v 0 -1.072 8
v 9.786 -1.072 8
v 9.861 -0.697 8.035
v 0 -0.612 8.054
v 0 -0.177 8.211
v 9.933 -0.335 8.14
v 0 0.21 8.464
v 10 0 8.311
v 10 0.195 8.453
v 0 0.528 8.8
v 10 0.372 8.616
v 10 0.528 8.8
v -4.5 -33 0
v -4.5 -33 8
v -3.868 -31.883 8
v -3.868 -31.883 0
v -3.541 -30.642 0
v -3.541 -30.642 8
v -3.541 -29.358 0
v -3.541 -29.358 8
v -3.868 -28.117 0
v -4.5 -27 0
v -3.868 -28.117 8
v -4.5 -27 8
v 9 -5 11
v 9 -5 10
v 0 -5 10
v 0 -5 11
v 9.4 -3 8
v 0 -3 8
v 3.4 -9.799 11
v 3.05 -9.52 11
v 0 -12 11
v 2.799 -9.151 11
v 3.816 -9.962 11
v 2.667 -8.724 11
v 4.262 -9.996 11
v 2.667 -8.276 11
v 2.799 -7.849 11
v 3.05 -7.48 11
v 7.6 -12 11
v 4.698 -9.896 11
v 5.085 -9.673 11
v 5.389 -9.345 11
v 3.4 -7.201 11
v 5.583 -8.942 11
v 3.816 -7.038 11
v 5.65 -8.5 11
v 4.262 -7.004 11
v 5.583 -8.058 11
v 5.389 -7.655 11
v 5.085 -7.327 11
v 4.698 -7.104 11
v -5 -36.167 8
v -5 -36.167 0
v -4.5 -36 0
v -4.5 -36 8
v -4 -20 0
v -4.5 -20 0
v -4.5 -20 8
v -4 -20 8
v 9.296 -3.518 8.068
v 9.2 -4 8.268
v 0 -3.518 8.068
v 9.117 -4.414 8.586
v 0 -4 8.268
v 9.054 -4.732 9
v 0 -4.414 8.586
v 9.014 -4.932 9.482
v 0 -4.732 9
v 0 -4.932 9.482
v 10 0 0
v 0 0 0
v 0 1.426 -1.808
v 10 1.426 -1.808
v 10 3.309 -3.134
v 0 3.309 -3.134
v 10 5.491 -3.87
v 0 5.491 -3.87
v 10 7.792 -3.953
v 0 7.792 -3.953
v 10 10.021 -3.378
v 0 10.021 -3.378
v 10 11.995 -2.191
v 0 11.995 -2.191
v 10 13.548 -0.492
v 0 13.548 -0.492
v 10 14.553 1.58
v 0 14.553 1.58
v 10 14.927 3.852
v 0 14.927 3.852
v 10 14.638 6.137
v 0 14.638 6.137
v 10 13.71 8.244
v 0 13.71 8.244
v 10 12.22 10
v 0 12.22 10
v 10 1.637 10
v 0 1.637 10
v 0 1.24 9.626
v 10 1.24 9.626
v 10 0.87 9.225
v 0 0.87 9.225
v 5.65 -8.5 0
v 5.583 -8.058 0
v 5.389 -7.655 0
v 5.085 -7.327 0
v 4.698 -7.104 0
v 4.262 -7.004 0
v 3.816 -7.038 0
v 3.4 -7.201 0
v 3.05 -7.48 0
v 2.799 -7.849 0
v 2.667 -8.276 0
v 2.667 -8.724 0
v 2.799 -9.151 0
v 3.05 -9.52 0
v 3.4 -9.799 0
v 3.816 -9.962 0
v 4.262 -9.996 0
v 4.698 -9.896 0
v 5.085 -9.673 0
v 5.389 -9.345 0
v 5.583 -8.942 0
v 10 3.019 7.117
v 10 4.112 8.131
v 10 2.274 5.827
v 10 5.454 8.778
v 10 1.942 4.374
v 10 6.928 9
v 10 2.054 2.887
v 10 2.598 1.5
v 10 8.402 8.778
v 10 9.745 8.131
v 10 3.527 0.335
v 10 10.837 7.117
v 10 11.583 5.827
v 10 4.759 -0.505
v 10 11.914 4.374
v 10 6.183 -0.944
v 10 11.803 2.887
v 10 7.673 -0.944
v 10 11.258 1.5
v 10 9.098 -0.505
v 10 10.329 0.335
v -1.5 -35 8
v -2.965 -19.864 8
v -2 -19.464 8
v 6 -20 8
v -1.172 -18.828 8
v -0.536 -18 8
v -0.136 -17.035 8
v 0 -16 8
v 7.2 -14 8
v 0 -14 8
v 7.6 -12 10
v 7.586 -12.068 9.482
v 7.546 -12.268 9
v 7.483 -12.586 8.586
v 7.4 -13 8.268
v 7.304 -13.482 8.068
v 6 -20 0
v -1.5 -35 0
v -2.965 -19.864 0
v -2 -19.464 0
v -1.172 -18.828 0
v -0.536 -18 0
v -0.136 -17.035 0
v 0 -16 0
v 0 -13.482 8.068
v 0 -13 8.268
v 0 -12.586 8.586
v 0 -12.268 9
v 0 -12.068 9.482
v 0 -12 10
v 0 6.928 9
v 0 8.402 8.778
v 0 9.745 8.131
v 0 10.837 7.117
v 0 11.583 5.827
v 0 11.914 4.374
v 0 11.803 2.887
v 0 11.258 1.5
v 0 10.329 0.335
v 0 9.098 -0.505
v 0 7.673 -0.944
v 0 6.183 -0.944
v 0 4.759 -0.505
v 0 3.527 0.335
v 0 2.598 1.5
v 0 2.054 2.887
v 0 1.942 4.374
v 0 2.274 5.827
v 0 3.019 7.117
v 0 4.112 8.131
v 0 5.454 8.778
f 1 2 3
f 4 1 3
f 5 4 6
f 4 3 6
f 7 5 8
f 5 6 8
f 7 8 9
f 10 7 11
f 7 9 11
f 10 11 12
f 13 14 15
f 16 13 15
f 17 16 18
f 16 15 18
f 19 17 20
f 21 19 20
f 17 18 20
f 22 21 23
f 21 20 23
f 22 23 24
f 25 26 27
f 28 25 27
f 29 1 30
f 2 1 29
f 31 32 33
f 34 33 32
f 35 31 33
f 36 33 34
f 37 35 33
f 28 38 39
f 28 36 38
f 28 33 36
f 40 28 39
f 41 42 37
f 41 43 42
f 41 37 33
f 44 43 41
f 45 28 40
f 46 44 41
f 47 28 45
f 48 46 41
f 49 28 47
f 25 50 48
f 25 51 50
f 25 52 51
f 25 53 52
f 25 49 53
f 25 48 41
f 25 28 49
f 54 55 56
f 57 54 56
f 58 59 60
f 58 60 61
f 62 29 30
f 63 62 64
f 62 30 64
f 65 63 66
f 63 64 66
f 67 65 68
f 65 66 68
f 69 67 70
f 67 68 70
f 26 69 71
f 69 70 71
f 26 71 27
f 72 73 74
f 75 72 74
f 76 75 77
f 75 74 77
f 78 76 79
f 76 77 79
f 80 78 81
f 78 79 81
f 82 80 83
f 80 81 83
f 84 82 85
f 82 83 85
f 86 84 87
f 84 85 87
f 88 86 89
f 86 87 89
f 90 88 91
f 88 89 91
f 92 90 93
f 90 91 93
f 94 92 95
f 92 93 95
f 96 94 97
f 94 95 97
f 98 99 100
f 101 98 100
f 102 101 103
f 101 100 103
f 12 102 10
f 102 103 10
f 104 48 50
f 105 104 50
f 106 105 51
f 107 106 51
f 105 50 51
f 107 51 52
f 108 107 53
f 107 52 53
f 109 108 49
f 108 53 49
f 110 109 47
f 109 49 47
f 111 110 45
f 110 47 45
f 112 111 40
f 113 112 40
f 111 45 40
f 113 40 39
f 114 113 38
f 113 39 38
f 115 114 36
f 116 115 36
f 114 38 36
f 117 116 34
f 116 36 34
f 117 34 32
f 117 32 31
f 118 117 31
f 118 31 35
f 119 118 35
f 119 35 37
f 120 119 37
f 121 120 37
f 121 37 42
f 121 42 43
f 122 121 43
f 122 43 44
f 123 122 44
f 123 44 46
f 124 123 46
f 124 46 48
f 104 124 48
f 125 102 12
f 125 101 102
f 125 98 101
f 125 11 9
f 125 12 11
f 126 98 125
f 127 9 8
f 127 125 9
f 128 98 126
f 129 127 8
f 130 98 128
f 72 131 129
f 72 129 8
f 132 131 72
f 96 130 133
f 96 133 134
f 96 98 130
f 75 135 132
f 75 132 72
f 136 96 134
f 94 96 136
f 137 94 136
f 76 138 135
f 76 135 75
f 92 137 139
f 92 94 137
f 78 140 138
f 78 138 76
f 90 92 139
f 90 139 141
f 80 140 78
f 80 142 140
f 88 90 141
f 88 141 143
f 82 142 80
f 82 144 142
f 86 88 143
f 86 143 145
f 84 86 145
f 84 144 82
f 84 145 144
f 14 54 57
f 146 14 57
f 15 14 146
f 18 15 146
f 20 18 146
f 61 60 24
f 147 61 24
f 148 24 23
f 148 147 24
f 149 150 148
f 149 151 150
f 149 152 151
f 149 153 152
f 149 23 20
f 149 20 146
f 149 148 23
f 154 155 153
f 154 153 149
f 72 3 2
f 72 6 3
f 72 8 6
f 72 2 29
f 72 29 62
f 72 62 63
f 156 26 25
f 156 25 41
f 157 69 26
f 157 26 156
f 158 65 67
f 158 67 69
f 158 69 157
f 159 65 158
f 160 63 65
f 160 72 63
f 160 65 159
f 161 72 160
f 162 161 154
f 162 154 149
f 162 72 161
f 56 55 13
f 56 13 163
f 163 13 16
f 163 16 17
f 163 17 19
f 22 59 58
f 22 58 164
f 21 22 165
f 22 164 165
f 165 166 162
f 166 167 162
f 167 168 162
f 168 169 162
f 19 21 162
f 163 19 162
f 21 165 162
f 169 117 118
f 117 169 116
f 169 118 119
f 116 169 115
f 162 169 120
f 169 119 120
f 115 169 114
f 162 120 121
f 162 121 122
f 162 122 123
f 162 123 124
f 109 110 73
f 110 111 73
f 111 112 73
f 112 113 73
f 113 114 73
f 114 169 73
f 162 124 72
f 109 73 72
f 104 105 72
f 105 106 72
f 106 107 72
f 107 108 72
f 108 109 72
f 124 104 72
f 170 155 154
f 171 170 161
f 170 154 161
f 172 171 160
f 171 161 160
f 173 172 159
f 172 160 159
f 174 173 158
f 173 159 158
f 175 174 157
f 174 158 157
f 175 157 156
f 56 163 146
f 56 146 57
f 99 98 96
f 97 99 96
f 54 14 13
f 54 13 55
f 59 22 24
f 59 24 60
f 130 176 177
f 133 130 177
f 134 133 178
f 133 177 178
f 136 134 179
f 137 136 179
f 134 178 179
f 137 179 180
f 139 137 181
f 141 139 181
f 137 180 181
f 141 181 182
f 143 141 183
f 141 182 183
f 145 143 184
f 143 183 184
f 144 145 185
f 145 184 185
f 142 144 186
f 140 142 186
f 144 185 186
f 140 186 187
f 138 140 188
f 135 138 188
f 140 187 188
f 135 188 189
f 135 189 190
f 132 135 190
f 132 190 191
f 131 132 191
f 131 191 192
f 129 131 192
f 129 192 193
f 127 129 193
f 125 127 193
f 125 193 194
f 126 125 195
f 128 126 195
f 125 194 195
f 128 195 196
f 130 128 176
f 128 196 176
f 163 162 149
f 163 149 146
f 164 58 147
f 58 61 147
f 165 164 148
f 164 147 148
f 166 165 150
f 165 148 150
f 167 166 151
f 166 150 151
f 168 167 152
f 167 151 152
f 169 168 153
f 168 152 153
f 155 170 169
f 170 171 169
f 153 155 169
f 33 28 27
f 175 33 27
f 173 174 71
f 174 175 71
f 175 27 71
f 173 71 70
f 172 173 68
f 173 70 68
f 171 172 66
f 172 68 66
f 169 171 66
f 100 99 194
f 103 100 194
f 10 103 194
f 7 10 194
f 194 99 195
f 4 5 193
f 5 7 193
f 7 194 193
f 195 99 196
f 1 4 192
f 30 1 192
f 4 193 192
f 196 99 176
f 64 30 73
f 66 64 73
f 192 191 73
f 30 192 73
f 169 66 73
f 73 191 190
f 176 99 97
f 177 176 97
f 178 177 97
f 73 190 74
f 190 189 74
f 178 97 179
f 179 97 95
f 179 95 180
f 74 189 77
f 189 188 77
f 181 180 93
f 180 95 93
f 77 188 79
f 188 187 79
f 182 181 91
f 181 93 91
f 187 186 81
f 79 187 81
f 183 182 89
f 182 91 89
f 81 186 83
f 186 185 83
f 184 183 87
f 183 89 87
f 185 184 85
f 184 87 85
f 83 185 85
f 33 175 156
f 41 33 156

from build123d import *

# Parameters (mm, degrees)
BOSS_EXTRU_1_DEPTH           = 8
CONG_1_R                     = 4
ESQUISSE2_R                  = 5
ENL_V_MAT_EXTRU_1_DEPTH      = 9
BOSS_EXTRU_2_DEPTH           = 8
ESQUISSE4_R                  = 5
BOSS_EXTRU_3_DEPTH           = 10
ENL_V_MAT_EXTRU_2_DEPTH      = 1
ENL_V_MAT_EXTRU_2_DEPTH_BACK = 16
BOSS_EXTRU_4_DEPTH           = 3
CONG_2_R                     = 2
ESQUISSE7_R                  = 1.5
ENL_V_MAT_EXTRU_3_DEPTH      = 16


with BuildPart() as part:
    # Esquisse1 → Boss.-Extru.1 (new body)
    with BuildSketch(Plane.XY):
        Polygon((0, 0), (10, 0), (6, -20), (-1.5, -35), (-4.5, -36), (-4.5, -20), (0, -20), align=None)
    extrude(amount=BOSS_EXTRU_1_DEPTH)

    # Congé1
    cong_1_edges = [part.edges().sort_by_distance(p)[0] for p in [
        (0, -20, 4),
    ]]
    fillet(cong_1_edges, radius=CONG_1_R)

    # Esquisse2 → Enlèv. mat.-Extru.1 (cut, through all)
    with BuildSketch(Plane.XY.offset(8)):
        with Locations((-8.5, -30)):
            Circle(ESQUISSE2_R)
    extrude(amount=-ENL_V_MAT_EXTRU_1_DEPTH, mode=Mode.SUBTRACT)

    # Esquisse3 → Boss.-Extru.2 (add)
    with BuildSketch(Plane.XY.offset(8)):
        Polygon((-4.5, -33), (-5, -36.166666667), (-4.5, -36), align=None)
    extrude(amount=-BOSS_EXTRU_2_DEPTH)

    # Esquisse4 → Boss.-Extru.3 (add)
    with BuildSketch(Plane.ZY):
        with BuildLine():
            Line((8, 0), (0, 0))
            ThreePointArc((0, 0), (4, 14.92820323), (8, 0))
        make_face()
        with Locations((4, 6.92820323)):
            Circle(ESQUISSE4_R, mode=Mode.SUBTRACT)
    extrude(amount=-BOSS_EXTRU_3_DEPTH)

    # Esquisse5 → Enlèv. mat.-Extru.2 (cut, two sides)
    with BuildSketch(Plane(origin=(10, 0, 0), x_dir=(0, 0, -1), z_dir=(1, 0, 0))) as enl_v_mat_extru_2_sk:
        Polygon((-10, 122.961773442), (-10, 12.219705852), (-10, 1.636700608), (-10, -109.105366981), (-231.484135179, -109.105366981), (-231.484135179, 122.961773442), align=None)
    extrude(amount=ENL_V_MAT_EXTRU_2_DEPTH, mode=Mode.SUBTRACT)
    extrude(enl_v_mat_extru_2_sk.sketch, amount=-ENL_V_MAT_EXTRU_2_DEPTH_BACK, mode=Mode.SUBTRACT)

    # Esquisse6 → Boss.-Extru.4 (add)
    with BuildSketch(Plane.XY.offset(8)):
        Polygon((0, -5), (0, -12), (7.6, -12), (9, -5), align=None)
    extrude(amount=BOSS_EXTRU_4_DEPTH)

    # Congé2
    cong_2_edges = [part.edges().sort_by_distance(p)[0] for p in [
        (5, 0, 8),
        (4.5, -5, 8),
        (3.8, -12, 8),
    ]]
    fillet(cong_2_edges, radius=CONG_2_R)

    # Esquisse7 → Enlèv. mat.-Extru.3 (cut, through all)
    with BuildSketch(Plane.XY.offset(11)):
        with Locations((4.15, -8.5)):
            Circle(ESQUISSE7_R)
    extrude(amount=-ENL_V_MAT_EXTRU_3_DEPTH, mode=Mode.SUBTRACT)


solid = part.part
